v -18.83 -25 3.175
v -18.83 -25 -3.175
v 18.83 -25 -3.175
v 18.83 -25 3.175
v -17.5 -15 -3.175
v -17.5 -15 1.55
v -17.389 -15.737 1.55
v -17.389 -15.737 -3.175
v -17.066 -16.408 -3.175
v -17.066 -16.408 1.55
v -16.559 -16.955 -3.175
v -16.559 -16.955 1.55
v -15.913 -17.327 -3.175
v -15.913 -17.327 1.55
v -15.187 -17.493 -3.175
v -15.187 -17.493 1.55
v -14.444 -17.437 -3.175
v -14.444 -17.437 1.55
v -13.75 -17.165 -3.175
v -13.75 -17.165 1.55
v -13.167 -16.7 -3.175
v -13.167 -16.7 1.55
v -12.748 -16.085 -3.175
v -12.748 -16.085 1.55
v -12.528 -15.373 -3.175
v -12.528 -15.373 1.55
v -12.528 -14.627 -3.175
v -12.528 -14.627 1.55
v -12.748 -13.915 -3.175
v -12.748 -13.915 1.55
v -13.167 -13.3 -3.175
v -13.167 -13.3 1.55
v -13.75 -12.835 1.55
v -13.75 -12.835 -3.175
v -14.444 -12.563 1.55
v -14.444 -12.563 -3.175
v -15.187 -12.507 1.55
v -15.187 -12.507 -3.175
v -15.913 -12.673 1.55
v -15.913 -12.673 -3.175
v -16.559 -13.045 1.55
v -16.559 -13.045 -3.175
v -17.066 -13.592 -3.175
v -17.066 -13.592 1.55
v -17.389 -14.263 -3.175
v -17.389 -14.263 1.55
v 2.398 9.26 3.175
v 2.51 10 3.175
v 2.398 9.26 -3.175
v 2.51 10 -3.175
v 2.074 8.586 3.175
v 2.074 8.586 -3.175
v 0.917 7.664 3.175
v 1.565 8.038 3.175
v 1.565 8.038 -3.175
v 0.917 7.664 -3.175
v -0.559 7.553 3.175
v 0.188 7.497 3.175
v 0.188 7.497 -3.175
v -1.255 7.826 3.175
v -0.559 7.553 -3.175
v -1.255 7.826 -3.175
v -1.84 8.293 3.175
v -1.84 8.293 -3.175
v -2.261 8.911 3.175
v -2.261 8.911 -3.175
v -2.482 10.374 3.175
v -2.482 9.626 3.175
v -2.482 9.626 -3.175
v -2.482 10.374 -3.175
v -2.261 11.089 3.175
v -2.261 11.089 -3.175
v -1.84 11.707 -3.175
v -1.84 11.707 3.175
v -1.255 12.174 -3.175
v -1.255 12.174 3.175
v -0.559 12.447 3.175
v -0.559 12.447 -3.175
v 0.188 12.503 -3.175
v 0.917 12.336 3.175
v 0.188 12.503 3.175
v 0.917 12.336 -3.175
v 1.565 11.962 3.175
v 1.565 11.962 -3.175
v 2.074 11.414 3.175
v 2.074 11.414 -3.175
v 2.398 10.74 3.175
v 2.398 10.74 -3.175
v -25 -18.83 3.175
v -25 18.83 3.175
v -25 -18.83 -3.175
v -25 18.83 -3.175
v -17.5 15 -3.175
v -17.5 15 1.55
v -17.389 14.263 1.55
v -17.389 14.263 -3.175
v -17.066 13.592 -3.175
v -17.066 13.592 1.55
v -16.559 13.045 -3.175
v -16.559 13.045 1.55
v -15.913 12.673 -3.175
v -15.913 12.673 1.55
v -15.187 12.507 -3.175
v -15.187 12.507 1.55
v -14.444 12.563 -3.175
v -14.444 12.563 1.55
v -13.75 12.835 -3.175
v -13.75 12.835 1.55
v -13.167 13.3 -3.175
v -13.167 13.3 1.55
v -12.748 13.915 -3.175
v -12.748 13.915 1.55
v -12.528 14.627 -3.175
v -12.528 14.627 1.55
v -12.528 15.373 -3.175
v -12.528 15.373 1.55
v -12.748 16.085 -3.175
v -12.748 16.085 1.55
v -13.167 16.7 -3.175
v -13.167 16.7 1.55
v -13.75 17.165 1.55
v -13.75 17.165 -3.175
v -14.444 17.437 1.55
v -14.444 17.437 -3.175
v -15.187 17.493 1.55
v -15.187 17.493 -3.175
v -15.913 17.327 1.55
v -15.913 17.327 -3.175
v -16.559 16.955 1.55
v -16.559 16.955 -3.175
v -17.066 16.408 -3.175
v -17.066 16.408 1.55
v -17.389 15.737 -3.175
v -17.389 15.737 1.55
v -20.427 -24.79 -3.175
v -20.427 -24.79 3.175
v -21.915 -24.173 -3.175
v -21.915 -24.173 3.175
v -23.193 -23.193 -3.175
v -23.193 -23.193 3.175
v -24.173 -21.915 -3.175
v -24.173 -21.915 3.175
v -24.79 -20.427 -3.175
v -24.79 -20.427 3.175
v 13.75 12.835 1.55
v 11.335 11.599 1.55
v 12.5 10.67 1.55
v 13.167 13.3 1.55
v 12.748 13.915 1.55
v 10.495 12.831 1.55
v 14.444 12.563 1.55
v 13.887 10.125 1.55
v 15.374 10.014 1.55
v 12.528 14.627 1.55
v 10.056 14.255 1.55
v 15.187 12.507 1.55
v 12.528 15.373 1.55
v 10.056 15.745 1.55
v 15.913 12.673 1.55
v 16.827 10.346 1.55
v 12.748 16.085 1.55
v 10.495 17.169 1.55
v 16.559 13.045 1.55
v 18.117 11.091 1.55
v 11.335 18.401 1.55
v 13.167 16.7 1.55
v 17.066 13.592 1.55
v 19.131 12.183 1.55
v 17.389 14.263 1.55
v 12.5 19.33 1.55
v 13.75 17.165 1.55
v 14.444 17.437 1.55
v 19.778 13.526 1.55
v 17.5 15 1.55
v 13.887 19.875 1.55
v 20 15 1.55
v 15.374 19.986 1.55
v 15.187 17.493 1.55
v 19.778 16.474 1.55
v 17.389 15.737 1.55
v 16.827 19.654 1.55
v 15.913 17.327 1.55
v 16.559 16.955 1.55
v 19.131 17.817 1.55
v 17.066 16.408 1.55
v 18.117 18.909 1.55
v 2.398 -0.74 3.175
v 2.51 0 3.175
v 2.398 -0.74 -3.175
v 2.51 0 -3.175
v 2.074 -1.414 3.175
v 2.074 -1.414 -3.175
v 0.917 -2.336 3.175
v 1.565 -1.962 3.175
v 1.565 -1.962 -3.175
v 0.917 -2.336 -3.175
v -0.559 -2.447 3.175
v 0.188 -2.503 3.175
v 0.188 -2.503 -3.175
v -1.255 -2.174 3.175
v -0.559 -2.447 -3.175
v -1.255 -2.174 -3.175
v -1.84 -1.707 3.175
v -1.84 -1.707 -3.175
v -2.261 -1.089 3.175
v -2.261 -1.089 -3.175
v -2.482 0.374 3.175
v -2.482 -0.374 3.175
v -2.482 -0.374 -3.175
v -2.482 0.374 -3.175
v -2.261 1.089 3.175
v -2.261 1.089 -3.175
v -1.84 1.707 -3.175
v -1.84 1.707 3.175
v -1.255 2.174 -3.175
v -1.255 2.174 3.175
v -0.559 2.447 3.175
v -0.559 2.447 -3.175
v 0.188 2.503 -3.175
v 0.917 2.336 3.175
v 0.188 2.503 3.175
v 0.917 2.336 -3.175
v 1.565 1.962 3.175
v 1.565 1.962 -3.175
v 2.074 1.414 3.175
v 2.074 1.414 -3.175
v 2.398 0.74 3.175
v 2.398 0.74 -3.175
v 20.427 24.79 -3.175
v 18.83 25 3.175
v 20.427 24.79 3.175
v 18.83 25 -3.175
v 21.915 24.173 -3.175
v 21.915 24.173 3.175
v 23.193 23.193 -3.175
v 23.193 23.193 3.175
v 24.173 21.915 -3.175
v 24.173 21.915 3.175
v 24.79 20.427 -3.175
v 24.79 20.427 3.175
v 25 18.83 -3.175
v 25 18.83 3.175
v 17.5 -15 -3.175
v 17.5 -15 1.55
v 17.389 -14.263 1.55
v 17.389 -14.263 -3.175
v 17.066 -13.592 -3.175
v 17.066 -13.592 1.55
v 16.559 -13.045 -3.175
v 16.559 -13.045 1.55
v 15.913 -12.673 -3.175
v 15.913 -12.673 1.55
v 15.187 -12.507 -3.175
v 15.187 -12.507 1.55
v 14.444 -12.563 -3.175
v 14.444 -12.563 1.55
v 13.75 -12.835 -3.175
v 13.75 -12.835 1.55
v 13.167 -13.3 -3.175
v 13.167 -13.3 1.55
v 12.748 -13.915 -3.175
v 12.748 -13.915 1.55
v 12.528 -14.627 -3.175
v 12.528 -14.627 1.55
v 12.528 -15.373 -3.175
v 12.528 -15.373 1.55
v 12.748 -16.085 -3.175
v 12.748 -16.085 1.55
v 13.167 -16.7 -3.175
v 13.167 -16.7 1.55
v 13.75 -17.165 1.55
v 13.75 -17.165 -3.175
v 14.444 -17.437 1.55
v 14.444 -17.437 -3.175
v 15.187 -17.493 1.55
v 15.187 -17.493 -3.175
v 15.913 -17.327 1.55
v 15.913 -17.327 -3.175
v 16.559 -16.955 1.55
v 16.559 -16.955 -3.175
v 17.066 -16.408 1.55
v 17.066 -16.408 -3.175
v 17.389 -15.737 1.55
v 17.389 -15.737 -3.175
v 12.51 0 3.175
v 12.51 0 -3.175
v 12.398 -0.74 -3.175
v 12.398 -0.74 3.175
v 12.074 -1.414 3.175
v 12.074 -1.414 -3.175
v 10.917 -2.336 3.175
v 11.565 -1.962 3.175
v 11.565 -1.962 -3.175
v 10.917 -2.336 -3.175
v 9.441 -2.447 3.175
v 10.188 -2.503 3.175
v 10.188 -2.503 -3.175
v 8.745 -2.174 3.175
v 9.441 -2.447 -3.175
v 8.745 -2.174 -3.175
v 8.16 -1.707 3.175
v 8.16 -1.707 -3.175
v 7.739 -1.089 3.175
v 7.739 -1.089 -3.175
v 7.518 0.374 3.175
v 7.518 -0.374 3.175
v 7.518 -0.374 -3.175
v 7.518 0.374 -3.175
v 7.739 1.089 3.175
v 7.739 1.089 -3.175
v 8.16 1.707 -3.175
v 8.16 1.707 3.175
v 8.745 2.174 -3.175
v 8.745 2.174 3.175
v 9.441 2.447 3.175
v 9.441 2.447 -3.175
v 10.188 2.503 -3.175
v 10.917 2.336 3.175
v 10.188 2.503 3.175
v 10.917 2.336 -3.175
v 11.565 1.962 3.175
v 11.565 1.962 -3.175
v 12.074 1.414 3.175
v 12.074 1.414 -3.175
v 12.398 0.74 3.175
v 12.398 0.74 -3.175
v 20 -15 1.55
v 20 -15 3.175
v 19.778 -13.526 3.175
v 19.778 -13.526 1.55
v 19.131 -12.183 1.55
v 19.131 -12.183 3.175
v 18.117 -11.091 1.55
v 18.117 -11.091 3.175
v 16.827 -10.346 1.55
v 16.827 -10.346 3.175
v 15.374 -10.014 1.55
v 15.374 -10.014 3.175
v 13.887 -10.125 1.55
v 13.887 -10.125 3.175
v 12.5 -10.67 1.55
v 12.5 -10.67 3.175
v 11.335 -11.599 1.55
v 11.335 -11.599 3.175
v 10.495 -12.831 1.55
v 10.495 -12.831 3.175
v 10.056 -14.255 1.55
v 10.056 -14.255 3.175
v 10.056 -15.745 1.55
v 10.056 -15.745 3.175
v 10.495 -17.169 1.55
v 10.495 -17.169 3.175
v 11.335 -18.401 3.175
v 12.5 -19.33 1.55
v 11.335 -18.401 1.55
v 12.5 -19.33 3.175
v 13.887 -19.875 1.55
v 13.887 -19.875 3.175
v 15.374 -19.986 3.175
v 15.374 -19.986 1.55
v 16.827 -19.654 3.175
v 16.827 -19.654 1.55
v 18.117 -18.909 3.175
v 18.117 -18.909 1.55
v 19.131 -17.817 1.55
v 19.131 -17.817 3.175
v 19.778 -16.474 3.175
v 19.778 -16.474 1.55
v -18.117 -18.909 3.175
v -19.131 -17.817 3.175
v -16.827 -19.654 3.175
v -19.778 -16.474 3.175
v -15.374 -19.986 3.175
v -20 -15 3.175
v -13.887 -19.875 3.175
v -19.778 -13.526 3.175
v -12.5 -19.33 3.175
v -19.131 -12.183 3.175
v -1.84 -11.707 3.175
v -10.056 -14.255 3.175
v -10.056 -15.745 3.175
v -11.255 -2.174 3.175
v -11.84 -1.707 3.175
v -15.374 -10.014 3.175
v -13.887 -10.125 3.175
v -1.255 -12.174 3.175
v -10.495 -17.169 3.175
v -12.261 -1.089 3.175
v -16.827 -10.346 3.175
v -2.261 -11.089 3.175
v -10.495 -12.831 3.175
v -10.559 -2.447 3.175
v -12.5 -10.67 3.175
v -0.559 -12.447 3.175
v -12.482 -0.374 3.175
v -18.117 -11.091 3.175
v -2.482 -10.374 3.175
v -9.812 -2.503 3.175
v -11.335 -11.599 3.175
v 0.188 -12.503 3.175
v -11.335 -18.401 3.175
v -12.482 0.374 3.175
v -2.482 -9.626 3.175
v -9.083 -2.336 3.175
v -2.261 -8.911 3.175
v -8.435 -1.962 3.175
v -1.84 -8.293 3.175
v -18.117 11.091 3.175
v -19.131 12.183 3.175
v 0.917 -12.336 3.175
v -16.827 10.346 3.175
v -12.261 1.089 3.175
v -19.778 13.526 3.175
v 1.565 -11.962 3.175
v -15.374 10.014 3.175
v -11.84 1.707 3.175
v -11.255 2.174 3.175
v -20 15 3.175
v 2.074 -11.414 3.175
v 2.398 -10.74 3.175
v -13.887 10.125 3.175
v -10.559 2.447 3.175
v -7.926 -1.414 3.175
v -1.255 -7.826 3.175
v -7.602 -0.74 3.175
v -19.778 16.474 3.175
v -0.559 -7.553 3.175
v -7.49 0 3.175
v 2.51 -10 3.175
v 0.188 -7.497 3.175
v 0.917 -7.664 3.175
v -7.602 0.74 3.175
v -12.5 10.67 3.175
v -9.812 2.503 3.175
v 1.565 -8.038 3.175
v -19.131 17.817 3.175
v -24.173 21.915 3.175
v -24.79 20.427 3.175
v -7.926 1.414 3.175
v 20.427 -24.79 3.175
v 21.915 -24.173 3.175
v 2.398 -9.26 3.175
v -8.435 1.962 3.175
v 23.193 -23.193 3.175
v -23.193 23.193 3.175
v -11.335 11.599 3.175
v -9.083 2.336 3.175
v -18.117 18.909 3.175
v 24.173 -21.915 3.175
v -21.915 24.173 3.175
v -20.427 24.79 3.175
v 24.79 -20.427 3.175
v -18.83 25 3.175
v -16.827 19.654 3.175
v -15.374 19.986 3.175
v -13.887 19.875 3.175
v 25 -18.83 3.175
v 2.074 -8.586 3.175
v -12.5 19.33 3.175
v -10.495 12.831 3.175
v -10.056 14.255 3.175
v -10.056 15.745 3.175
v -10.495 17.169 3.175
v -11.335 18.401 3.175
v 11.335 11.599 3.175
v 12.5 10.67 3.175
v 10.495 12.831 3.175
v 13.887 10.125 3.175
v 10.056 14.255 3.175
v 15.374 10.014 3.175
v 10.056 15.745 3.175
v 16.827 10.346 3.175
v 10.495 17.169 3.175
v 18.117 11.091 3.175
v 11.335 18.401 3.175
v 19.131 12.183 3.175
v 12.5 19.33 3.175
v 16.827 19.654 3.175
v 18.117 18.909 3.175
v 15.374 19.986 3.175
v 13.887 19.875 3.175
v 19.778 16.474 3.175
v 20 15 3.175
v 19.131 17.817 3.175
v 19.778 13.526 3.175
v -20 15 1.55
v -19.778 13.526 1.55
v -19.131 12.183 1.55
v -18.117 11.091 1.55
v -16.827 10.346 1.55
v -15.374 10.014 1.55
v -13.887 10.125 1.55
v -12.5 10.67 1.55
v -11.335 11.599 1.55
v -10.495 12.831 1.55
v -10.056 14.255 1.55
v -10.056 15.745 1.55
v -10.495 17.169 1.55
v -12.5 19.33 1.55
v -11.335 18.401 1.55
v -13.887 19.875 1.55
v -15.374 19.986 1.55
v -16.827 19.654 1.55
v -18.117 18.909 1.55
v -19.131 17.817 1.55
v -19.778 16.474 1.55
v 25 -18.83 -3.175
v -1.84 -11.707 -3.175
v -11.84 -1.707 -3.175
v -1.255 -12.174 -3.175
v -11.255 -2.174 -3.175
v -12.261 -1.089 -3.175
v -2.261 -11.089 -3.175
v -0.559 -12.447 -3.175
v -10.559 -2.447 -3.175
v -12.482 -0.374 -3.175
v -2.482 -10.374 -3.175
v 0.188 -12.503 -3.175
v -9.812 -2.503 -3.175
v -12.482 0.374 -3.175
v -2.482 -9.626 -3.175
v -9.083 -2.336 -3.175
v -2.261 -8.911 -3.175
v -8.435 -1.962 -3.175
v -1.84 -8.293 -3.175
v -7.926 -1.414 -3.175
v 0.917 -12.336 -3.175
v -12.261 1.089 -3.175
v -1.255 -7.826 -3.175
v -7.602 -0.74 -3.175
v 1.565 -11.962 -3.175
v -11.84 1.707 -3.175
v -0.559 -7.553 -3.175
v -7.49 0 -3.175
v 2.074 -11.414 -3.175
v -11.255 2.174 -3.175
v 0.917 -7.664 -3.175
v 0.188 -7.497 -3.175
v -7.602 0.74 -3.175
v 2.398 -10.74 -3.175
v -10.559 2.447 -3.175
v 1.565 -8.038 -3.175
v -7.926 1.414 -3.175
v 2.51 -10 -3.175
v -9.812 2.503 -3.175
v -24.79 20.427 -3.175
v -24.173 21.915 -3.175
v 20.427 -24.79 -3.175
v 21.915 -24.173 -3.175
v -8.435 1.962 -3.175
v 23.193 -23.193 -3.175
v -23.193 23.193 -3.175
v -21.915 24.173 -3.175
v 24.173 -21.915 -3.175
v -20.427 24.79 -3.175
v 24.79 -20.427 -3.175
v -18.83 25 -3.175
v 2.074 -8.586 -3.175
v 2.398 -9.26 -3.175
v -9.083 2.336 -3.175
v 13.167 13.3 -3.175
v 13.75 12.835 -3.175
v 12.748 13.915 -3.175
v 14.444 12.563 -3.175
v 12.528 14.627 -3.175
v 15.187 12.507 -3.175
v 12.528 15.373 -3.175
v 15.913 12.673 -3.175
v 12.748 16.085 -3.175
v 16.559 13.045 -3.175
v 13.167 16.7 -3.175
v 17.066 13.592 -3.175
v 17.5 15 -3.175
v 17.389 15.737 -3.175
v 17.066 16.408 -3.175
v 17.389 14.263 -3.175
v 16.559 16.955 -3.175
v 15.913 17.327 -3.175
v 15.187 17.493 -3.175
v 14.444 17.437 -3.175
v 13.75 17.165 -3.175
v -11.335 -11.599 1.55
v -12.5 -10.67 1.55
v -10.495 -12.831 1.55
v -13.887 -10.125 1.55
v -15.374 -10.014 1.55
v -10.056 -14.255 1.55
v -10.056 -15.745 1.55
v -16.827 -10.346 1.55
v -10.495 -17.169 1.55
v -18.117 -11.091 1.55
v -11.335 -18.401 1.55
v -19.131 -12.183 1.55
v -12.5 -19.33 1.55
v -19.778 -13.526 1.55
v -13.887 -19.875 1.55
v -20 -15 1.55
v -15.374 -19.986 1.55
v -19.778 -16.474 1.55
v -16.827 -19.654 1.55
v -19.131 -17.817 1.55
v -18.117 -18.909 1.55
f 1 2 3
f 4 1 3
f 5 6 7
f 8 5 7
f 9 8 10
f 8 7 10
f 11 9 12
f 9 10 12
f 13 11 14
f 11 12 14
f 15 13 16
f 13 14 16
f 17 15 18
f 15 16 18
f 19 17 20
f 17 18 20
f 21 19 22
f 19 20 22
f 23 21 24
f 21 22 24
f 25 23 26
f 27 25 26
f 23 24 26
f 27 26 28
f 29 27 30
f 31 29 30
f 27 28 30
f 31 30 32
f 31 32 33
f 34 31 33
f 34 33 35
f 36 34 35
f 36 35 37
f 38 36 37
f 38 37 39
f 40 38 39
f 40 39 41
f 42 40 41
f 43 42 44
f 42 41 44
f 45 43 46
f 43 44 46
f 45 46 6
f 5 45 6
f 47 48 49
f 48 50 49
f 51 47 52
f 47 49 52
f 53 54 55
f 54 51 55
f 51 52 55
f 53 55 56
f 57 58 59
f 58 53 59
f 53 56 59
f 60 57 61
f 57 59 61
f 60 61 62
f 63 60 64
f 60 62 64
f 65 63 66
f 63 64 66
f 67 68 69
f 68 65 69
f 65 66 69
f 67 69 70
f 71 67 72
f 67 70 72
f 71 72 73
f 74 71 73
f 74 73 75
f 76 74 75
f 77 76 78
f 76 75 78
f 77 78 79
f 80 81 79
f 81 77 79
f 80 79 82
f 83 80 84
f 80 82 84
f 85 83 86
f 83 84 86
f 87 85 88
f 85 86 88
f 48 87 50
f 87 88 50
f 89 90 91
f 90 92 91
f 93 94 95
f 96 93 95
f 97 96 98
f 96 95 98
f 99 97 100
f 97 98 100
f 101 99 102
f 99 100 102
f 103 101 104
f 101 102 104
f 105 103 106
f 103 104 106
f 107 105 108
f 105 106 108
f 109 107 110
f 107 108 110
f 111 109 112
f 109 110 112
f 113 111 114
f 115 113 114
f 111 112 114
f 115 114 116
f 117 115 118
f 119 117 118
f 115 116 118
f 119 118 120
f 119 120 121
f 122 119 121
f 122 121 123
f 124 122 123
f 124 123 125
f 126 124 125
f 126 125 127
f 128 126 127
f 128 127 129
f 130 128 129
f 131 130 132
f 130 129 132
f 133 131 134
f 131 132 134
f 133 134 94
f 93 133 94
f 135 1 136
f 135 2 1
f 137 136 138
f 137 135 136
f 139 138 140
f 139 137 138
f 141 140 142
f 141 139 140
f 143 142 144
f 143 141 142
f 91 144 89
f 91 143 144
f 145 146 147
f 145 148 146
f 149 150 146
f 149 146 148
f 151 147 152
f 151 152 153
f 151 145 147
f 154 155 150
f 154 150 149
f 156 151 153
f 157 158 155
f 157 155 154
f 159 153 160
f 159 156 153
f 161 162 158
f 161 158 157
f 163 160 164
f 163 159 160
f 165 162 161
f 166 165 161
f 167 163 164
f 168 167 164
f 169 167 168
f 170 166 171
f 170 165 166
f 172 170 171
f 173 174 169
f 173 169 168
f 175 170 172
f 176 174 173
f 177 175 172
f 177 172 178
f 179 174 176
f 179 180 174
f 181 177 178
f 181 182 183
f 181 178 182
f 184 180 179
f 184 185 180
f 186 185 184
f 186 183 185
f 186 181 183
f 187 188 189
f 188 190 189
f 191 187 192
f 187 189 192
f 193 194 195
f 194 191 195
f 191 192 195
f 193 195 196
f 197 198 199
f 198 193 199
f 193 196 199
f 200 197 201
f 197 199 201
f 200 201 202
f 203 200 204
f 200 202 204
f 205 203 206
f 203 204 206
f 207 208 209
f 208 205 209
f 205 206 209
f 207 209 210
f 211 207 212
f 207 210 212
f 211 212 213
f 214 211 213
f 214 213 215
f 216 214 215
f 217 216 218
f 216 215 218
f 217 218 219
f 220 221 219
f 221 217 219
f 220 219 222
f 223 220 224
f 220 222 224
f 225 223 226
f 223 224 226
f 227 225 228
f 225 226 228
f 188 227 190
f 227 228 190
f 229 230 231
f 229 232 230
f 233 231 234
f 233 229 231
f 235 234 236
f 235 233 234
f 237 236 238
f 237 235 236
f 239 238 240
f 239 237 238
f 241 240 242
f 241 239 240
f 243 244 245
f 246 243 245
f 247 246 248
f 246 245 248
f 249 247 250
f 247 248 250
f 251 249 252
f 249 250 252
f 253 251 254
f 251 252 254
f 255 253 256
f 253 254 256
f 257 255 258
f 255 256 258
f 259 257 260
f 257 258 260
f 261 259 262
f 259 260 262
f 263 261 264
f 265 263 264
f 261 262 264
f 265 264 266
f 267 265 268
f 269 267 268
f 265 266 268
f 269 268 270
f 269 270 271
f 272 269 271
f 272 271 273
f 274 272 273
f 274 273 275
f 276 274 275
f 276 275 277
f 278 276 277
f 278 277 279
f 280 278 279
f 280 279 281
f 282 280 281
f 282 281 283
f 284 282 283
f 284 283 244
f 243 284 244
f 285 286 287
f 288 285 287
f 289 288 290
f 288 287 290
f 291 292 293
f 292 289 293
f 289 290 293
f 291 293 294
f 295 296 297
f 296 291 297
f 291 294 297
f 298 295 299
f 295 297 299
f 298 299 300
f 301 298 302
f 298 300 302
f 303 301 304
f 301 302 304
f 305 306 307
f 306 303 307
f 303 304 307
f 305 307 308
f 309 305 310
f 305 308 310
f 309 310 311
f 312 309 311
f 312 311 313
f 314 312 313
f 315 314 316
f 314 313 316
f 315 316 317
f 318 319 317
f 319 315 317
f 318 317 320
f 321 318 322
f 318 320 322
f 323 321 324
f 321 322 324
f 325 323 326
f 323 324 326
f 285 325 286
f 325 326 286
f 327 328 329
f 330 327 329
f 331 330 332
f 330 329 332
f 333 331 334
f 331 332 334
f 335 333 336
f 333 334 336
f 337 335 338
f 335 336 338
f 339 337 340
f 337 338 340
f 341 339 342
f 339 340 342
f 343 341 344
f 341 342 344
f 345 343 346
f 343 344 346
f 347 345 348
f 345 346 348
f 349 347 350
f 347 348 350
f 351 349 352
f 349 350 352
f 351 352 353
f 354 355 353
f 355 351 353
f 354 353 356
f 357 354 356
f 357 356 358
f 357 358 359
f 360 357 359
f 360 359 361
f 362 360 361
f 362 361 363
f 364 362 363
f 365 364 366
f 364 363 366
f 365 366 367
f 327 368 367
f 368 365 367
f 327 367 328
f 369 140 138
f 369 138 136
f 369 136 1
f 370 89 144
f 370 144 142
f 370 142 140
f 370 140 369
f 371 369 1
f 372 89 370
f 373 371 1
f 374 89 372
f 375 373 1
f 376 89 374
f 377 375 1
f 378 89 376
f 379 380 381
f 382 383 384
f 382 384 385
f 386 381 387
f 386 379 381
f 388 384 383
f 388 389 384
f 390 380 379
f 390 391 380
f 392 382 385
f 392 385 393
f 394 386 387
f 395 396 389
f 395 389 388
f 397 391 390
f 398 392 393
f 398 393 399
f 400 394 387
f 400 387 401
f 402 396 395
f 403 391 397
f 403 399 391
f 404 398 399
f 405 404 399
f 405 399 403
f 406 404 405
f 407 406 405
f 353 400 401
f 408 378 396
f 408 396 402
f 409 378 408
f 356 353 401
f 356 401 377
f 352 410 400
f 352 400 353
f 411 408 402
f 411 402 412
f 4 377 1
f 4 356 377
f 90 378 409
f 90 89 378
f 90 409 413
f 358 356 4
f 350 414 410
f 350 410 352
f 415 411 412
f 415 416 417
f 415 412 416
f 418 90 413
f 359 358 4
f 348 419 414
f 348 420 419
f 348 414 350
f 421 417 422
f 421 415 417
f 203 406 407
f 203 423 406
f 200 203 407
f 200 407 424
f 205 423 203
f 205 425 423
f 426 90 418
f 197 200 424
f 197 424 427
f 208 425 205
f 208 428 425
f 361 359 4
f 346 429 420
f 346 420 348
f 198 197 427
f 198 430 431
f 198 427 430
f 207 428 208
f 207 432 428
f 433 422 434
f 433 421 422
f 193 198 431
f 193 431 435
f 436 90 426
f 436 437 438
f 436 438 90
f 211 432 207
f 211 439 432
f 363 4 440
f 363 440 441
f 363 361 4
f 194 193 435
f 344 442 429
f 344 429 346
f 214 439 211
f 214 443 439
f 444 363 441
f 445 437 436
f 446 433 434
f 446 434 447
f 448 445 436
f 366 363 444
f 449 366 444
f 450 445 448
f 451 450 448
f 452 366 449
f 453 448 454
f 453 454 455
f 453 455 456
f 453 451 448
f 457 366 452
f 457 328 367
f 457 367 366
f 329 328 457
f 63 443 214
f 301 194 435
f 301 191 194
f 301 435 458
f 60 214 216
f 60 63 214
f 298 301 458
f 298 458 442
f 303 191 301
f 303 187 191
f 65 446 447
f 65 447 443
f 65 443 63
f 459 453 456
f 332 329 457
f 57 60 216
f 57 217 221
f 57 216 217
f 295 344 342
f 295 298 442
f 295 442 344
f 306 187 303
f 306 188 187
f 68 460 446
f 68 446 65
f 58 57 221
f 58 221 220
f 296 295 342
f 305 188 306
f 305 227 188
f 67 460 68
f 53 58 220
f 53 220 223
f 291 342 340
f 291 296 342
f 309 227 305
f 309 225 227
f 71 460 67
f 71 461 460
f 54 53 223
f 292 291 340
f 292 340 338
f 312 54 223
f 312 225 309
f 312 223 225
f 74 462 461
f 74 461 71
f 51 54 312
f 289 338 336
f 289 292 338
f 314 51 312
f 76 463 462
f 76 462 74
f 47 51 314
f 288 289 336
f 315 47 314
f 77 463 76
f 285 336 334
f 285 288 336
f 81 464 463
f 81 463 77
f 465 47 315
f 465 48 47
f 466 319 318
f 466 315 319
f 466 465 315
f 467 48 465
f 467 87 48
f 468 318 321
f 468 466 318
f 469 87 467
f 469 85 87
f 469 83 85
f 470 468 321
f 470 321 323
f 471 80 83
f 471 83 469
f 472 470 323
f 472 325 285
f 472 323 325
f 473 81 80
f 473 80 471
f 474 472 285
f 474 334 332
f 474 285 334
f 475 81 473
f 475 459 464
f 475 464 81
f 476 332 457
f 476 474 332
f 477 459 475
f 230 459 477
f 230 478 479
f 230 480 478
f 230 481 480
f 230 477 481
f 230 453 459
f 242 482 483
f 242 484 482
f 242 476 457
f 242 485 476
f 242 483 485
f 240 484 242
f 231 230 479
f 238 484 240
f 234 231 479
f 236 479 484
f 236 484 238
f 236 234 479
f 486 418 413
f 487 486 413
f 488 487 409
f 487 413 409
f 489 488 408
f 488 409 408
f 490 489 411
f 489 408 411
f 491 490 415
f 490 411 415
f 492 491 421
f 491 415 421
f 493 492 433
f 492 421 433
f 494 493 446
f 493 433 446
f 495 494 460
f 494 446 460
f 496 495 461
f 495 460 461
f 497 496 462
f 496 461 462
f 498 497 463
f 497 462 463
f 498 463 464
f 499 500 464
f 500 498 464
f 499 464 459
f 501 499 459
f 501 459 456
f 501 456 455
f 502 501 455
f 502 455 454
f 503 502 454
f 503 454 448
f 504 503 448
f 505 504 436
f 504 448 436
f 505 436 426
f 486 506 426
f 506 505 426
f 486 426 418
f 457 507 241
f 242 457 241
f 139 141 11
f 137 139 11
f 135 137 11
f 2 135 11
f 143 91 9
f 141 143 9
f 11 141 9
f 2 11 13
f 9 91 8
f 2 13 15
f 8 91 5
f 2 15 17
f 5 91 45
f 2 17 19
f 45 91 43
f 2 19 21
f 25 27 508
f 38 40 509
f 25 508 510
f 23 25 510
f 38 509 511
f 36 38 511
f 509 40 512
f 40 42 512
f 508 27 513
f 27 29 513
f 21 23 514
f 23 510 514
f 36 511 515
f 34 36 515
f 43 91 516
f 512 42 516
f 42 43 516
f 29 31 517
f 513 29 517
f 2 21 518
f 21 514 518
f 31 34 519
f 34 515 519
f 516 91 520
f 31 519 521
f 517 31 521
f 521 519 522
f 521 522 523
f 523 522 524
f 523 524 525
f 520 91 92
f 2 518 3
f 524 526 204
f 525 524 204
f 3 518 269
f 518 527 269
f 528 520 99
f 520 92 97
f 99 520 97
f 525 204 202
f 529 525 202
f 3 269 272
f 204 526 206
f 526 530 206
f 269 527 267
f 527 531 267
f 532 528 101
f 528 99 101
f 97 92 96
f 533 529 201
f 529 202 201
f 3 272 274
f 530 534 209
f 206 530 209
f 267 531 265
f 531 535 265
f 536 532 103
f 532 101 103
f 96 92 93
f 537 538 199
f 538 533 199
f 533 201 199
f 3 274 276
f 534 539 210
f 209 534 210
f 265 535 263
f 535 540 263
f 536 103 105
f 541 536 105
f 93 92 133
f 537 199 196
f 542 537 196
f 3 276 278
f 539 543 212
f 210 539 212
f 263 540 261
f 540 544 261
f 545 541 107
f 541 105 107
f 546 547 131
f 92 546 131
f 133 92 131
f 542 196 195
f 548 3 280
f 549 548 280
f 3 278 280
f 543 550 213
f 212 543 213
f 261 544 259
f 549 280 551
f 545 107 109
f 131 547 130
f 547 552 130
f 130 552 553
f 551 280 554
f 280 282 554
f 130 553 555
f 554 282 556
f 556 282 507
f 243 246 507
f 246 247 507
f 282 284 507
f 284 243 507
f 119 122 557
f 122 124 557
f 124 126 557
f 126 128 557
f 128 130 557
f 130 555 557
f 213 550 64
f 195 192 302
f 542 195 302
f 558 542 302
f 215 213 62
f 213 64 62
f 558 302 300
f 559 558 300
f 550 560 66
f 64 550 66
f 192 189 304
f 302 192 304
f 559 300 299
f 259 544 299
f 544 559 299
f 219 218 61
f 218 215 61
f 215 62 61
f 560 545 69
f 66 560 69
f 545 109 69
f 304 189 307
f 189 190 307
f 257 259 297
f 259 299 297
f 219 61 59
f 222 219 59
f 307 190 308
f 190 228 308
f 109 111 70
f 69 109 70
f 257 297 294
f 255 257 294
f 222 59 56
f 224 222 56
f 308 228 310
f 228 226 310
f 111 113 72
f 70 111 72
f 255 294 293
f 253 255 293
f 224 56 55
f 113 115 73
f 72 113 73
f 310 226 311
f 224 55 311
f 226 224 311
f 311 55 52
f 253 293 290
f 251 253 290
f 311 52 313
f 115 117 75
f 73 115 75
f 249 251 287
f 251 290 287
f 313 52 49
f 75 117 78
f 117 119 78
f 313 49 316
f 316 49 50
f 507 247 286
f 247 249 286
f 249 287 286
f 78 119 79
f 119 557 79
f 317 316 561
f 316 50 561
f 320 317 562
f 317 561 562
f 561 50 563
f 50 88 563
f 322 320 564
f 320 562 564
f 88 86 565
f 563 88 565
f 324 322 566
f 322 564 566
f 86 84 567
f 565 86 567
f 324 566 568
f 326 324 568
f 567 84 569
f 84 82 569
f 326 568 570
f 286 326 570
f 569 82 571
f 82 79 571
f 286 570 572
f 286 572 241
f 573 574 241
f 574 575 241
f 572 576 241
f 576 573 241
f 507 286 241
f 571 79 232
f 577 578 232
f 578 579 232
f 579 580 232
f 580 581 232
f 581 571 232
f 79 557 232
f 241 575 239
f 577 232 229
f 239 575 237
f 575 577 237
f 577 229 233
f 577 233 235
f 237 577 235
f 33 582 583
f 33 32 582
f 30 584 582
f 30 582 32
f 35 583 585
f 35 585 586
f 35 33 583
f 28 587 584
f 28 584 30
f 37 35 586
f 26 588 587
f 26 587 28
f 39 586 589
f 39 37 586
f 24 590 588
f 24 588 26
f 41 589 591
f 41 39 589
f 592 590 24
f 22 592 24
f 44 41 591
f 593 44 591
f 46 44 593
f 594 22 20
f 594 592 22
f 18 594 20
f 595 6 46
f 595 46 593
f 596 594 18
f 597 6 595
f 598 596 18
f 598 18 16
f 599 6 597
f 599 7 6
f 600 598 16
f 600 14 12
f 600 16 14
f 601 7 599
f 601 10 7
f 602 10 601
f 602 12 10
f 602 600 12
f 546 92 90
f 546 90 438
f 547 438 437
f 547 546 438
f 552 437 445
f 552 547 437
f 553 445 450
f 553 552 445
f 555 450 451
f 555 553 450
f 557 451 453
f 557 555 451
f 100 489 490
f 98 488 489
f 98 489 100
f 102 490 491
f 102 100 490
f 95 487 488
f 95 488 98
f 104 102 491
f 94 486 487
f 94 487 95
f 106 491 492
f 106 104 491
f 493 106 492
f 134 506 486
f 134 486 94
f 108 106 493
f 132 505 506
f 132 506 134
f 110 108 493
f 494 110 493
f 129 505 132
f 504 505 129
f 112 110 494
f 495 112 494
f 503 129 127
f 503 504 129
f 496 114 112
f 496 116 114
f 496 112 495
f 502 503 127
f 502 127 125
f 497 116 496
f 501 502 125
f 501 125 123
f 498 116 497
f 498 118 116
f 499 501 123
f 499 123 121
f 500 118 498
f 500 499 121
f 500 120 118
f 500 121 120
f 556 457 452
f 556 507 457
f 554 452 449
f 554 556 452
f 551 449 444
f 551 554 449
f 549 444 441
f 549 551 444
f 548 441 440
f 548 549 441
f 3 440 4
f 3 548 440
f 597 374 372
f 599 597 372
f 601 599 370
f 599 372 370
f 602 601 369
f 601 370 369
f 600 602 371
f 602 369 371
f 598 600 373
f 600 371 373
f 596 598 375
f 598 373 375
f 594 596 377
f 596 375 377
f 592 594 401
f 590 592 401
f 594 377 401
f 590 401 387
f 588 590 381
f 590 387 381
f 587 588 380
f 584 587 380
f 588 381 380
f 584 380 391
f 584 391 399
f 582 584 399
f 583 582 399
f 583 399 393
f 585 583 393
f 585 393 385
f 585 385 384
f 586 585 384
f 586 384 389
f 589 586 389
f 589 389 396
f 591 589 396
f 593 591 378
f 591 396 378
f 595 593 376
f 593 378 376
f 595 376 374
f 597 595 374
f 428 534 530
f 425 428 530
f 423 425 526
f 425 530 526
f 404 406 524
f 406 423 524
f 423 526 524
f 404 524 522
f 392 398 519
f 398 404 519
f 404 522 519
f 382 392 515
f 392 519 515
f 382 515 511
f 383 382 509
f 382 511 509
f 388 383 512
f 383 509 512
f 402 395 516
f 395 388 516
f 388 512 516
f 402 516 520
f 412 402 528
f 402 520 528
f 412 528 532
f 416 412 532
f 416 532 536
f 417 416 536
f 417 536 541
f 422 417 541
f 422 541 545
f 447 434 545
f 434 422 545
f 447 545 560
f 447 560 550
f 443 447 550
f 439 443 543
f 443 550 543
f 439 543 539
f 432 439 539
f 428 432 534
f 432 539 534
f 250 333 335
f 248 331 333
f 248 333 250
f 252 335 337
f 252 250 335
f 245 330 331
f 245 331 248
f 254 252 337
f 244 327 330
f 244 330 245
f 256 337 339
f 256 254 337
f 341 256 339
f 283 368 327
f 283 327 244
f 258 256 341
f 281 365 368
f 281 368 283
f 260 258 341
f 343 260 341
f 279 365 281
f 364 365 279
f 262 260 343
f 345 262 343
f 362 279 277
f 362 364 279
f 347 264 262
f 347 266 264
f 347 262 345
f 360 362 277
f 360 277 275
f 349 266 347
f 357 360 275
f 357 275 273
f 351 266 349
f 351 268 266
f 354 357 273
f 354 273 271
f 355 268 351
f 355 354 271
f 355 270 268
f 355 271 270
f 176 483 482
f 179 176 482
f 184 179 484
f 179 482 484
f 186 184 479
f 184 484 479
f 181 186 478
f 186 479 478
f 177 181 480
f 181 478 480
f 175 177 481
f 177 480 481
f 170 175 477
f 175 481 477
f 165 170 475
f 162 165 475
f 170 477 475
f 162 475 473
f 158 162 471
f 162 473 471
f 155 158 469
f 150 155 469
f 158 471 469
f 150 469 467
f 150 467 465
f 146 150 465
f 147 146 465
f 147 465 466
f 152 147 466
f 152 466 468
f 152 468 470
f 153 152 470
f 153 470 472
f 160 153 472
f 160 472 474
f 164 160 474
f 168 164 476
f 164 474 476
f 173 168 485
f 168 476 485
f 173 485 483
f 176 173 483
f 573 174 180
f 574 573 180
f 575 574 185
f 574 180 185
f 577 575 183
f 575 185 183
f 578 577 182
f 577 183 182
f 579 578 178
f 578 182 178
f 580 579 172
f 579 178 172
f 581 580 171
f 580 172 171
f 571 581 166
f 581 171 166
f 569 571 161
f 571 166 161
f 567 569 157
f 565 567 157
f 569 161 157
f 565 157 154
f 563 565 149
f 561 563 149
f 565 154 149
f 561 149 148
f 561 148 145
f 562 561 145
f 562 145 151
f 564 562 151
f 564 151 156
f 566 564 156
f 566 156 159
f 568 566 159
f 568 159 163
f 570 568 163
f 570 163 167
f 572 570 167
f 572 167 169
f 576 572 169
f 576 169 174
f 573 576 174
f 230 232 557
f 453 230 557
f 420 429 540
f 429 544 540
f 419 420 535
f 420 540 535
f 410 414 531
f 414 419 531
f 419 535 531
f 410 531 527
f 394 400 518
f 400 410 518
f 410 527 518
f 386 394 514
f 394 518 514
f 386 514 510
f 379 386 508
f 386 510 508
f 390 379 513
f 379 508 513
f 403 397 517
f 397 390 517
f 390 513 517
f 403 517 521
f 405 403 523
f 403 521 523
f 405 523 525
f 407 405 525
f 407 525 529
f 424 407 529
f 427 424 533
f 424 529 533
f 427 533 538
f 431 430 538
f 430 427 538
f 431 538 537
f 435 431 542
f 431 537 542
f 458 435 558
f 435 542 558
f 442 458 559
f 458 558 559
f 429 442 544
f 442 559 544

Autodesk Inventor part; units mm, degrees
ref_plane "YZ Plane" through (0, 0, 0) normal (1, 0, 0) x (0, 1, 0)
ref_plane "XZ Plane" through (0, 0, 0) normal (0, 1, 0) x (-1, 0, 0)
ref_plane "XY Plane" through (0, 0, 0) normal (0, 0, 1) x (1, 0, 0)
sketch "Sketch1" plane through (0, 0, 0) normal (0, 0, 1) x (1, 0, 0)
  line L0 (-18.83, -25) -> (18.83, -25)
  line L1 (25, -18.83) -> (25, 18.83)
  line L2 (18.83, 25) -> (-18.83, 25)
  line L3 (-25, 18.83) -> (-25, -18.83)
  line L4 (-25, -25) -> (25, 25) construction
  line L5 (25, -25) -> (-25, 25) construction
  circle A0 centre (0, 0) radius 2.51
  circle A1 centre (0, 10) radius 2.51
  circle A2 centre (-10, 0) radius 2.51
  circle A3 centre (0, -10) radius 2.51
  circle A4 centre (10, 0) radius 2.51
  arc A5 (-18.83, 25) -> (-25, 18.83) centre (-18.83, 18.83) ccw
  arc A6 (25, 18.83) -> (18.83, 25) centre (18.83, 18.83) ccw
  arc A7 (18.83, -25) -> (25, -18.83) centre (18.83, -18.83) ccw
  arc A8 (-25, -18.83) -> (-18.83, -25) centre (-18.83, -18.83) ccw
  dimension "d0" = 50
  dimension "d1" = 50
  dimension "d2" = 5.02
  dimension "d3" = 5.02
  dimension "d6" = 360
  dimension "d8" = 10
  dimension "d9" = 6.17
extrude "Extrusion1" add sketch "Sketch1" along normal mid plane 6.35
sketch "Sketch2" plane through (0, 0, 3.175) normal (0, 0, 1) x (1, 0, 0)
  circle A0 centre (15, 15) radius 5
  circle A1 centre (15, 15) radius 2.5
  point P0 (0, 0)
  dimension "d18" = 10
  dimension "d19" = 5
  dimension "d20" = 15
  dimension "d21" = 15
extrude "Extrusion3" cut sketch "Sketch2" against normal blind 1.625 contours A0 | A1
extrude "Extrusion4" cut sketch "Sketch2" against normal through all contours A1
mirror "Mirror1" about plane through (0, 0, 0) normal (1, 0, 0) of "Extrusion3", "Extrusion4"
mirror "Mirror2" about plane through (0, 0, 0) normal (0, 1, 0) of "Extrusion3", "Extrusion4", "Mirror1"
properties part number "vwheel_plate" material "Aluminum 6061"
